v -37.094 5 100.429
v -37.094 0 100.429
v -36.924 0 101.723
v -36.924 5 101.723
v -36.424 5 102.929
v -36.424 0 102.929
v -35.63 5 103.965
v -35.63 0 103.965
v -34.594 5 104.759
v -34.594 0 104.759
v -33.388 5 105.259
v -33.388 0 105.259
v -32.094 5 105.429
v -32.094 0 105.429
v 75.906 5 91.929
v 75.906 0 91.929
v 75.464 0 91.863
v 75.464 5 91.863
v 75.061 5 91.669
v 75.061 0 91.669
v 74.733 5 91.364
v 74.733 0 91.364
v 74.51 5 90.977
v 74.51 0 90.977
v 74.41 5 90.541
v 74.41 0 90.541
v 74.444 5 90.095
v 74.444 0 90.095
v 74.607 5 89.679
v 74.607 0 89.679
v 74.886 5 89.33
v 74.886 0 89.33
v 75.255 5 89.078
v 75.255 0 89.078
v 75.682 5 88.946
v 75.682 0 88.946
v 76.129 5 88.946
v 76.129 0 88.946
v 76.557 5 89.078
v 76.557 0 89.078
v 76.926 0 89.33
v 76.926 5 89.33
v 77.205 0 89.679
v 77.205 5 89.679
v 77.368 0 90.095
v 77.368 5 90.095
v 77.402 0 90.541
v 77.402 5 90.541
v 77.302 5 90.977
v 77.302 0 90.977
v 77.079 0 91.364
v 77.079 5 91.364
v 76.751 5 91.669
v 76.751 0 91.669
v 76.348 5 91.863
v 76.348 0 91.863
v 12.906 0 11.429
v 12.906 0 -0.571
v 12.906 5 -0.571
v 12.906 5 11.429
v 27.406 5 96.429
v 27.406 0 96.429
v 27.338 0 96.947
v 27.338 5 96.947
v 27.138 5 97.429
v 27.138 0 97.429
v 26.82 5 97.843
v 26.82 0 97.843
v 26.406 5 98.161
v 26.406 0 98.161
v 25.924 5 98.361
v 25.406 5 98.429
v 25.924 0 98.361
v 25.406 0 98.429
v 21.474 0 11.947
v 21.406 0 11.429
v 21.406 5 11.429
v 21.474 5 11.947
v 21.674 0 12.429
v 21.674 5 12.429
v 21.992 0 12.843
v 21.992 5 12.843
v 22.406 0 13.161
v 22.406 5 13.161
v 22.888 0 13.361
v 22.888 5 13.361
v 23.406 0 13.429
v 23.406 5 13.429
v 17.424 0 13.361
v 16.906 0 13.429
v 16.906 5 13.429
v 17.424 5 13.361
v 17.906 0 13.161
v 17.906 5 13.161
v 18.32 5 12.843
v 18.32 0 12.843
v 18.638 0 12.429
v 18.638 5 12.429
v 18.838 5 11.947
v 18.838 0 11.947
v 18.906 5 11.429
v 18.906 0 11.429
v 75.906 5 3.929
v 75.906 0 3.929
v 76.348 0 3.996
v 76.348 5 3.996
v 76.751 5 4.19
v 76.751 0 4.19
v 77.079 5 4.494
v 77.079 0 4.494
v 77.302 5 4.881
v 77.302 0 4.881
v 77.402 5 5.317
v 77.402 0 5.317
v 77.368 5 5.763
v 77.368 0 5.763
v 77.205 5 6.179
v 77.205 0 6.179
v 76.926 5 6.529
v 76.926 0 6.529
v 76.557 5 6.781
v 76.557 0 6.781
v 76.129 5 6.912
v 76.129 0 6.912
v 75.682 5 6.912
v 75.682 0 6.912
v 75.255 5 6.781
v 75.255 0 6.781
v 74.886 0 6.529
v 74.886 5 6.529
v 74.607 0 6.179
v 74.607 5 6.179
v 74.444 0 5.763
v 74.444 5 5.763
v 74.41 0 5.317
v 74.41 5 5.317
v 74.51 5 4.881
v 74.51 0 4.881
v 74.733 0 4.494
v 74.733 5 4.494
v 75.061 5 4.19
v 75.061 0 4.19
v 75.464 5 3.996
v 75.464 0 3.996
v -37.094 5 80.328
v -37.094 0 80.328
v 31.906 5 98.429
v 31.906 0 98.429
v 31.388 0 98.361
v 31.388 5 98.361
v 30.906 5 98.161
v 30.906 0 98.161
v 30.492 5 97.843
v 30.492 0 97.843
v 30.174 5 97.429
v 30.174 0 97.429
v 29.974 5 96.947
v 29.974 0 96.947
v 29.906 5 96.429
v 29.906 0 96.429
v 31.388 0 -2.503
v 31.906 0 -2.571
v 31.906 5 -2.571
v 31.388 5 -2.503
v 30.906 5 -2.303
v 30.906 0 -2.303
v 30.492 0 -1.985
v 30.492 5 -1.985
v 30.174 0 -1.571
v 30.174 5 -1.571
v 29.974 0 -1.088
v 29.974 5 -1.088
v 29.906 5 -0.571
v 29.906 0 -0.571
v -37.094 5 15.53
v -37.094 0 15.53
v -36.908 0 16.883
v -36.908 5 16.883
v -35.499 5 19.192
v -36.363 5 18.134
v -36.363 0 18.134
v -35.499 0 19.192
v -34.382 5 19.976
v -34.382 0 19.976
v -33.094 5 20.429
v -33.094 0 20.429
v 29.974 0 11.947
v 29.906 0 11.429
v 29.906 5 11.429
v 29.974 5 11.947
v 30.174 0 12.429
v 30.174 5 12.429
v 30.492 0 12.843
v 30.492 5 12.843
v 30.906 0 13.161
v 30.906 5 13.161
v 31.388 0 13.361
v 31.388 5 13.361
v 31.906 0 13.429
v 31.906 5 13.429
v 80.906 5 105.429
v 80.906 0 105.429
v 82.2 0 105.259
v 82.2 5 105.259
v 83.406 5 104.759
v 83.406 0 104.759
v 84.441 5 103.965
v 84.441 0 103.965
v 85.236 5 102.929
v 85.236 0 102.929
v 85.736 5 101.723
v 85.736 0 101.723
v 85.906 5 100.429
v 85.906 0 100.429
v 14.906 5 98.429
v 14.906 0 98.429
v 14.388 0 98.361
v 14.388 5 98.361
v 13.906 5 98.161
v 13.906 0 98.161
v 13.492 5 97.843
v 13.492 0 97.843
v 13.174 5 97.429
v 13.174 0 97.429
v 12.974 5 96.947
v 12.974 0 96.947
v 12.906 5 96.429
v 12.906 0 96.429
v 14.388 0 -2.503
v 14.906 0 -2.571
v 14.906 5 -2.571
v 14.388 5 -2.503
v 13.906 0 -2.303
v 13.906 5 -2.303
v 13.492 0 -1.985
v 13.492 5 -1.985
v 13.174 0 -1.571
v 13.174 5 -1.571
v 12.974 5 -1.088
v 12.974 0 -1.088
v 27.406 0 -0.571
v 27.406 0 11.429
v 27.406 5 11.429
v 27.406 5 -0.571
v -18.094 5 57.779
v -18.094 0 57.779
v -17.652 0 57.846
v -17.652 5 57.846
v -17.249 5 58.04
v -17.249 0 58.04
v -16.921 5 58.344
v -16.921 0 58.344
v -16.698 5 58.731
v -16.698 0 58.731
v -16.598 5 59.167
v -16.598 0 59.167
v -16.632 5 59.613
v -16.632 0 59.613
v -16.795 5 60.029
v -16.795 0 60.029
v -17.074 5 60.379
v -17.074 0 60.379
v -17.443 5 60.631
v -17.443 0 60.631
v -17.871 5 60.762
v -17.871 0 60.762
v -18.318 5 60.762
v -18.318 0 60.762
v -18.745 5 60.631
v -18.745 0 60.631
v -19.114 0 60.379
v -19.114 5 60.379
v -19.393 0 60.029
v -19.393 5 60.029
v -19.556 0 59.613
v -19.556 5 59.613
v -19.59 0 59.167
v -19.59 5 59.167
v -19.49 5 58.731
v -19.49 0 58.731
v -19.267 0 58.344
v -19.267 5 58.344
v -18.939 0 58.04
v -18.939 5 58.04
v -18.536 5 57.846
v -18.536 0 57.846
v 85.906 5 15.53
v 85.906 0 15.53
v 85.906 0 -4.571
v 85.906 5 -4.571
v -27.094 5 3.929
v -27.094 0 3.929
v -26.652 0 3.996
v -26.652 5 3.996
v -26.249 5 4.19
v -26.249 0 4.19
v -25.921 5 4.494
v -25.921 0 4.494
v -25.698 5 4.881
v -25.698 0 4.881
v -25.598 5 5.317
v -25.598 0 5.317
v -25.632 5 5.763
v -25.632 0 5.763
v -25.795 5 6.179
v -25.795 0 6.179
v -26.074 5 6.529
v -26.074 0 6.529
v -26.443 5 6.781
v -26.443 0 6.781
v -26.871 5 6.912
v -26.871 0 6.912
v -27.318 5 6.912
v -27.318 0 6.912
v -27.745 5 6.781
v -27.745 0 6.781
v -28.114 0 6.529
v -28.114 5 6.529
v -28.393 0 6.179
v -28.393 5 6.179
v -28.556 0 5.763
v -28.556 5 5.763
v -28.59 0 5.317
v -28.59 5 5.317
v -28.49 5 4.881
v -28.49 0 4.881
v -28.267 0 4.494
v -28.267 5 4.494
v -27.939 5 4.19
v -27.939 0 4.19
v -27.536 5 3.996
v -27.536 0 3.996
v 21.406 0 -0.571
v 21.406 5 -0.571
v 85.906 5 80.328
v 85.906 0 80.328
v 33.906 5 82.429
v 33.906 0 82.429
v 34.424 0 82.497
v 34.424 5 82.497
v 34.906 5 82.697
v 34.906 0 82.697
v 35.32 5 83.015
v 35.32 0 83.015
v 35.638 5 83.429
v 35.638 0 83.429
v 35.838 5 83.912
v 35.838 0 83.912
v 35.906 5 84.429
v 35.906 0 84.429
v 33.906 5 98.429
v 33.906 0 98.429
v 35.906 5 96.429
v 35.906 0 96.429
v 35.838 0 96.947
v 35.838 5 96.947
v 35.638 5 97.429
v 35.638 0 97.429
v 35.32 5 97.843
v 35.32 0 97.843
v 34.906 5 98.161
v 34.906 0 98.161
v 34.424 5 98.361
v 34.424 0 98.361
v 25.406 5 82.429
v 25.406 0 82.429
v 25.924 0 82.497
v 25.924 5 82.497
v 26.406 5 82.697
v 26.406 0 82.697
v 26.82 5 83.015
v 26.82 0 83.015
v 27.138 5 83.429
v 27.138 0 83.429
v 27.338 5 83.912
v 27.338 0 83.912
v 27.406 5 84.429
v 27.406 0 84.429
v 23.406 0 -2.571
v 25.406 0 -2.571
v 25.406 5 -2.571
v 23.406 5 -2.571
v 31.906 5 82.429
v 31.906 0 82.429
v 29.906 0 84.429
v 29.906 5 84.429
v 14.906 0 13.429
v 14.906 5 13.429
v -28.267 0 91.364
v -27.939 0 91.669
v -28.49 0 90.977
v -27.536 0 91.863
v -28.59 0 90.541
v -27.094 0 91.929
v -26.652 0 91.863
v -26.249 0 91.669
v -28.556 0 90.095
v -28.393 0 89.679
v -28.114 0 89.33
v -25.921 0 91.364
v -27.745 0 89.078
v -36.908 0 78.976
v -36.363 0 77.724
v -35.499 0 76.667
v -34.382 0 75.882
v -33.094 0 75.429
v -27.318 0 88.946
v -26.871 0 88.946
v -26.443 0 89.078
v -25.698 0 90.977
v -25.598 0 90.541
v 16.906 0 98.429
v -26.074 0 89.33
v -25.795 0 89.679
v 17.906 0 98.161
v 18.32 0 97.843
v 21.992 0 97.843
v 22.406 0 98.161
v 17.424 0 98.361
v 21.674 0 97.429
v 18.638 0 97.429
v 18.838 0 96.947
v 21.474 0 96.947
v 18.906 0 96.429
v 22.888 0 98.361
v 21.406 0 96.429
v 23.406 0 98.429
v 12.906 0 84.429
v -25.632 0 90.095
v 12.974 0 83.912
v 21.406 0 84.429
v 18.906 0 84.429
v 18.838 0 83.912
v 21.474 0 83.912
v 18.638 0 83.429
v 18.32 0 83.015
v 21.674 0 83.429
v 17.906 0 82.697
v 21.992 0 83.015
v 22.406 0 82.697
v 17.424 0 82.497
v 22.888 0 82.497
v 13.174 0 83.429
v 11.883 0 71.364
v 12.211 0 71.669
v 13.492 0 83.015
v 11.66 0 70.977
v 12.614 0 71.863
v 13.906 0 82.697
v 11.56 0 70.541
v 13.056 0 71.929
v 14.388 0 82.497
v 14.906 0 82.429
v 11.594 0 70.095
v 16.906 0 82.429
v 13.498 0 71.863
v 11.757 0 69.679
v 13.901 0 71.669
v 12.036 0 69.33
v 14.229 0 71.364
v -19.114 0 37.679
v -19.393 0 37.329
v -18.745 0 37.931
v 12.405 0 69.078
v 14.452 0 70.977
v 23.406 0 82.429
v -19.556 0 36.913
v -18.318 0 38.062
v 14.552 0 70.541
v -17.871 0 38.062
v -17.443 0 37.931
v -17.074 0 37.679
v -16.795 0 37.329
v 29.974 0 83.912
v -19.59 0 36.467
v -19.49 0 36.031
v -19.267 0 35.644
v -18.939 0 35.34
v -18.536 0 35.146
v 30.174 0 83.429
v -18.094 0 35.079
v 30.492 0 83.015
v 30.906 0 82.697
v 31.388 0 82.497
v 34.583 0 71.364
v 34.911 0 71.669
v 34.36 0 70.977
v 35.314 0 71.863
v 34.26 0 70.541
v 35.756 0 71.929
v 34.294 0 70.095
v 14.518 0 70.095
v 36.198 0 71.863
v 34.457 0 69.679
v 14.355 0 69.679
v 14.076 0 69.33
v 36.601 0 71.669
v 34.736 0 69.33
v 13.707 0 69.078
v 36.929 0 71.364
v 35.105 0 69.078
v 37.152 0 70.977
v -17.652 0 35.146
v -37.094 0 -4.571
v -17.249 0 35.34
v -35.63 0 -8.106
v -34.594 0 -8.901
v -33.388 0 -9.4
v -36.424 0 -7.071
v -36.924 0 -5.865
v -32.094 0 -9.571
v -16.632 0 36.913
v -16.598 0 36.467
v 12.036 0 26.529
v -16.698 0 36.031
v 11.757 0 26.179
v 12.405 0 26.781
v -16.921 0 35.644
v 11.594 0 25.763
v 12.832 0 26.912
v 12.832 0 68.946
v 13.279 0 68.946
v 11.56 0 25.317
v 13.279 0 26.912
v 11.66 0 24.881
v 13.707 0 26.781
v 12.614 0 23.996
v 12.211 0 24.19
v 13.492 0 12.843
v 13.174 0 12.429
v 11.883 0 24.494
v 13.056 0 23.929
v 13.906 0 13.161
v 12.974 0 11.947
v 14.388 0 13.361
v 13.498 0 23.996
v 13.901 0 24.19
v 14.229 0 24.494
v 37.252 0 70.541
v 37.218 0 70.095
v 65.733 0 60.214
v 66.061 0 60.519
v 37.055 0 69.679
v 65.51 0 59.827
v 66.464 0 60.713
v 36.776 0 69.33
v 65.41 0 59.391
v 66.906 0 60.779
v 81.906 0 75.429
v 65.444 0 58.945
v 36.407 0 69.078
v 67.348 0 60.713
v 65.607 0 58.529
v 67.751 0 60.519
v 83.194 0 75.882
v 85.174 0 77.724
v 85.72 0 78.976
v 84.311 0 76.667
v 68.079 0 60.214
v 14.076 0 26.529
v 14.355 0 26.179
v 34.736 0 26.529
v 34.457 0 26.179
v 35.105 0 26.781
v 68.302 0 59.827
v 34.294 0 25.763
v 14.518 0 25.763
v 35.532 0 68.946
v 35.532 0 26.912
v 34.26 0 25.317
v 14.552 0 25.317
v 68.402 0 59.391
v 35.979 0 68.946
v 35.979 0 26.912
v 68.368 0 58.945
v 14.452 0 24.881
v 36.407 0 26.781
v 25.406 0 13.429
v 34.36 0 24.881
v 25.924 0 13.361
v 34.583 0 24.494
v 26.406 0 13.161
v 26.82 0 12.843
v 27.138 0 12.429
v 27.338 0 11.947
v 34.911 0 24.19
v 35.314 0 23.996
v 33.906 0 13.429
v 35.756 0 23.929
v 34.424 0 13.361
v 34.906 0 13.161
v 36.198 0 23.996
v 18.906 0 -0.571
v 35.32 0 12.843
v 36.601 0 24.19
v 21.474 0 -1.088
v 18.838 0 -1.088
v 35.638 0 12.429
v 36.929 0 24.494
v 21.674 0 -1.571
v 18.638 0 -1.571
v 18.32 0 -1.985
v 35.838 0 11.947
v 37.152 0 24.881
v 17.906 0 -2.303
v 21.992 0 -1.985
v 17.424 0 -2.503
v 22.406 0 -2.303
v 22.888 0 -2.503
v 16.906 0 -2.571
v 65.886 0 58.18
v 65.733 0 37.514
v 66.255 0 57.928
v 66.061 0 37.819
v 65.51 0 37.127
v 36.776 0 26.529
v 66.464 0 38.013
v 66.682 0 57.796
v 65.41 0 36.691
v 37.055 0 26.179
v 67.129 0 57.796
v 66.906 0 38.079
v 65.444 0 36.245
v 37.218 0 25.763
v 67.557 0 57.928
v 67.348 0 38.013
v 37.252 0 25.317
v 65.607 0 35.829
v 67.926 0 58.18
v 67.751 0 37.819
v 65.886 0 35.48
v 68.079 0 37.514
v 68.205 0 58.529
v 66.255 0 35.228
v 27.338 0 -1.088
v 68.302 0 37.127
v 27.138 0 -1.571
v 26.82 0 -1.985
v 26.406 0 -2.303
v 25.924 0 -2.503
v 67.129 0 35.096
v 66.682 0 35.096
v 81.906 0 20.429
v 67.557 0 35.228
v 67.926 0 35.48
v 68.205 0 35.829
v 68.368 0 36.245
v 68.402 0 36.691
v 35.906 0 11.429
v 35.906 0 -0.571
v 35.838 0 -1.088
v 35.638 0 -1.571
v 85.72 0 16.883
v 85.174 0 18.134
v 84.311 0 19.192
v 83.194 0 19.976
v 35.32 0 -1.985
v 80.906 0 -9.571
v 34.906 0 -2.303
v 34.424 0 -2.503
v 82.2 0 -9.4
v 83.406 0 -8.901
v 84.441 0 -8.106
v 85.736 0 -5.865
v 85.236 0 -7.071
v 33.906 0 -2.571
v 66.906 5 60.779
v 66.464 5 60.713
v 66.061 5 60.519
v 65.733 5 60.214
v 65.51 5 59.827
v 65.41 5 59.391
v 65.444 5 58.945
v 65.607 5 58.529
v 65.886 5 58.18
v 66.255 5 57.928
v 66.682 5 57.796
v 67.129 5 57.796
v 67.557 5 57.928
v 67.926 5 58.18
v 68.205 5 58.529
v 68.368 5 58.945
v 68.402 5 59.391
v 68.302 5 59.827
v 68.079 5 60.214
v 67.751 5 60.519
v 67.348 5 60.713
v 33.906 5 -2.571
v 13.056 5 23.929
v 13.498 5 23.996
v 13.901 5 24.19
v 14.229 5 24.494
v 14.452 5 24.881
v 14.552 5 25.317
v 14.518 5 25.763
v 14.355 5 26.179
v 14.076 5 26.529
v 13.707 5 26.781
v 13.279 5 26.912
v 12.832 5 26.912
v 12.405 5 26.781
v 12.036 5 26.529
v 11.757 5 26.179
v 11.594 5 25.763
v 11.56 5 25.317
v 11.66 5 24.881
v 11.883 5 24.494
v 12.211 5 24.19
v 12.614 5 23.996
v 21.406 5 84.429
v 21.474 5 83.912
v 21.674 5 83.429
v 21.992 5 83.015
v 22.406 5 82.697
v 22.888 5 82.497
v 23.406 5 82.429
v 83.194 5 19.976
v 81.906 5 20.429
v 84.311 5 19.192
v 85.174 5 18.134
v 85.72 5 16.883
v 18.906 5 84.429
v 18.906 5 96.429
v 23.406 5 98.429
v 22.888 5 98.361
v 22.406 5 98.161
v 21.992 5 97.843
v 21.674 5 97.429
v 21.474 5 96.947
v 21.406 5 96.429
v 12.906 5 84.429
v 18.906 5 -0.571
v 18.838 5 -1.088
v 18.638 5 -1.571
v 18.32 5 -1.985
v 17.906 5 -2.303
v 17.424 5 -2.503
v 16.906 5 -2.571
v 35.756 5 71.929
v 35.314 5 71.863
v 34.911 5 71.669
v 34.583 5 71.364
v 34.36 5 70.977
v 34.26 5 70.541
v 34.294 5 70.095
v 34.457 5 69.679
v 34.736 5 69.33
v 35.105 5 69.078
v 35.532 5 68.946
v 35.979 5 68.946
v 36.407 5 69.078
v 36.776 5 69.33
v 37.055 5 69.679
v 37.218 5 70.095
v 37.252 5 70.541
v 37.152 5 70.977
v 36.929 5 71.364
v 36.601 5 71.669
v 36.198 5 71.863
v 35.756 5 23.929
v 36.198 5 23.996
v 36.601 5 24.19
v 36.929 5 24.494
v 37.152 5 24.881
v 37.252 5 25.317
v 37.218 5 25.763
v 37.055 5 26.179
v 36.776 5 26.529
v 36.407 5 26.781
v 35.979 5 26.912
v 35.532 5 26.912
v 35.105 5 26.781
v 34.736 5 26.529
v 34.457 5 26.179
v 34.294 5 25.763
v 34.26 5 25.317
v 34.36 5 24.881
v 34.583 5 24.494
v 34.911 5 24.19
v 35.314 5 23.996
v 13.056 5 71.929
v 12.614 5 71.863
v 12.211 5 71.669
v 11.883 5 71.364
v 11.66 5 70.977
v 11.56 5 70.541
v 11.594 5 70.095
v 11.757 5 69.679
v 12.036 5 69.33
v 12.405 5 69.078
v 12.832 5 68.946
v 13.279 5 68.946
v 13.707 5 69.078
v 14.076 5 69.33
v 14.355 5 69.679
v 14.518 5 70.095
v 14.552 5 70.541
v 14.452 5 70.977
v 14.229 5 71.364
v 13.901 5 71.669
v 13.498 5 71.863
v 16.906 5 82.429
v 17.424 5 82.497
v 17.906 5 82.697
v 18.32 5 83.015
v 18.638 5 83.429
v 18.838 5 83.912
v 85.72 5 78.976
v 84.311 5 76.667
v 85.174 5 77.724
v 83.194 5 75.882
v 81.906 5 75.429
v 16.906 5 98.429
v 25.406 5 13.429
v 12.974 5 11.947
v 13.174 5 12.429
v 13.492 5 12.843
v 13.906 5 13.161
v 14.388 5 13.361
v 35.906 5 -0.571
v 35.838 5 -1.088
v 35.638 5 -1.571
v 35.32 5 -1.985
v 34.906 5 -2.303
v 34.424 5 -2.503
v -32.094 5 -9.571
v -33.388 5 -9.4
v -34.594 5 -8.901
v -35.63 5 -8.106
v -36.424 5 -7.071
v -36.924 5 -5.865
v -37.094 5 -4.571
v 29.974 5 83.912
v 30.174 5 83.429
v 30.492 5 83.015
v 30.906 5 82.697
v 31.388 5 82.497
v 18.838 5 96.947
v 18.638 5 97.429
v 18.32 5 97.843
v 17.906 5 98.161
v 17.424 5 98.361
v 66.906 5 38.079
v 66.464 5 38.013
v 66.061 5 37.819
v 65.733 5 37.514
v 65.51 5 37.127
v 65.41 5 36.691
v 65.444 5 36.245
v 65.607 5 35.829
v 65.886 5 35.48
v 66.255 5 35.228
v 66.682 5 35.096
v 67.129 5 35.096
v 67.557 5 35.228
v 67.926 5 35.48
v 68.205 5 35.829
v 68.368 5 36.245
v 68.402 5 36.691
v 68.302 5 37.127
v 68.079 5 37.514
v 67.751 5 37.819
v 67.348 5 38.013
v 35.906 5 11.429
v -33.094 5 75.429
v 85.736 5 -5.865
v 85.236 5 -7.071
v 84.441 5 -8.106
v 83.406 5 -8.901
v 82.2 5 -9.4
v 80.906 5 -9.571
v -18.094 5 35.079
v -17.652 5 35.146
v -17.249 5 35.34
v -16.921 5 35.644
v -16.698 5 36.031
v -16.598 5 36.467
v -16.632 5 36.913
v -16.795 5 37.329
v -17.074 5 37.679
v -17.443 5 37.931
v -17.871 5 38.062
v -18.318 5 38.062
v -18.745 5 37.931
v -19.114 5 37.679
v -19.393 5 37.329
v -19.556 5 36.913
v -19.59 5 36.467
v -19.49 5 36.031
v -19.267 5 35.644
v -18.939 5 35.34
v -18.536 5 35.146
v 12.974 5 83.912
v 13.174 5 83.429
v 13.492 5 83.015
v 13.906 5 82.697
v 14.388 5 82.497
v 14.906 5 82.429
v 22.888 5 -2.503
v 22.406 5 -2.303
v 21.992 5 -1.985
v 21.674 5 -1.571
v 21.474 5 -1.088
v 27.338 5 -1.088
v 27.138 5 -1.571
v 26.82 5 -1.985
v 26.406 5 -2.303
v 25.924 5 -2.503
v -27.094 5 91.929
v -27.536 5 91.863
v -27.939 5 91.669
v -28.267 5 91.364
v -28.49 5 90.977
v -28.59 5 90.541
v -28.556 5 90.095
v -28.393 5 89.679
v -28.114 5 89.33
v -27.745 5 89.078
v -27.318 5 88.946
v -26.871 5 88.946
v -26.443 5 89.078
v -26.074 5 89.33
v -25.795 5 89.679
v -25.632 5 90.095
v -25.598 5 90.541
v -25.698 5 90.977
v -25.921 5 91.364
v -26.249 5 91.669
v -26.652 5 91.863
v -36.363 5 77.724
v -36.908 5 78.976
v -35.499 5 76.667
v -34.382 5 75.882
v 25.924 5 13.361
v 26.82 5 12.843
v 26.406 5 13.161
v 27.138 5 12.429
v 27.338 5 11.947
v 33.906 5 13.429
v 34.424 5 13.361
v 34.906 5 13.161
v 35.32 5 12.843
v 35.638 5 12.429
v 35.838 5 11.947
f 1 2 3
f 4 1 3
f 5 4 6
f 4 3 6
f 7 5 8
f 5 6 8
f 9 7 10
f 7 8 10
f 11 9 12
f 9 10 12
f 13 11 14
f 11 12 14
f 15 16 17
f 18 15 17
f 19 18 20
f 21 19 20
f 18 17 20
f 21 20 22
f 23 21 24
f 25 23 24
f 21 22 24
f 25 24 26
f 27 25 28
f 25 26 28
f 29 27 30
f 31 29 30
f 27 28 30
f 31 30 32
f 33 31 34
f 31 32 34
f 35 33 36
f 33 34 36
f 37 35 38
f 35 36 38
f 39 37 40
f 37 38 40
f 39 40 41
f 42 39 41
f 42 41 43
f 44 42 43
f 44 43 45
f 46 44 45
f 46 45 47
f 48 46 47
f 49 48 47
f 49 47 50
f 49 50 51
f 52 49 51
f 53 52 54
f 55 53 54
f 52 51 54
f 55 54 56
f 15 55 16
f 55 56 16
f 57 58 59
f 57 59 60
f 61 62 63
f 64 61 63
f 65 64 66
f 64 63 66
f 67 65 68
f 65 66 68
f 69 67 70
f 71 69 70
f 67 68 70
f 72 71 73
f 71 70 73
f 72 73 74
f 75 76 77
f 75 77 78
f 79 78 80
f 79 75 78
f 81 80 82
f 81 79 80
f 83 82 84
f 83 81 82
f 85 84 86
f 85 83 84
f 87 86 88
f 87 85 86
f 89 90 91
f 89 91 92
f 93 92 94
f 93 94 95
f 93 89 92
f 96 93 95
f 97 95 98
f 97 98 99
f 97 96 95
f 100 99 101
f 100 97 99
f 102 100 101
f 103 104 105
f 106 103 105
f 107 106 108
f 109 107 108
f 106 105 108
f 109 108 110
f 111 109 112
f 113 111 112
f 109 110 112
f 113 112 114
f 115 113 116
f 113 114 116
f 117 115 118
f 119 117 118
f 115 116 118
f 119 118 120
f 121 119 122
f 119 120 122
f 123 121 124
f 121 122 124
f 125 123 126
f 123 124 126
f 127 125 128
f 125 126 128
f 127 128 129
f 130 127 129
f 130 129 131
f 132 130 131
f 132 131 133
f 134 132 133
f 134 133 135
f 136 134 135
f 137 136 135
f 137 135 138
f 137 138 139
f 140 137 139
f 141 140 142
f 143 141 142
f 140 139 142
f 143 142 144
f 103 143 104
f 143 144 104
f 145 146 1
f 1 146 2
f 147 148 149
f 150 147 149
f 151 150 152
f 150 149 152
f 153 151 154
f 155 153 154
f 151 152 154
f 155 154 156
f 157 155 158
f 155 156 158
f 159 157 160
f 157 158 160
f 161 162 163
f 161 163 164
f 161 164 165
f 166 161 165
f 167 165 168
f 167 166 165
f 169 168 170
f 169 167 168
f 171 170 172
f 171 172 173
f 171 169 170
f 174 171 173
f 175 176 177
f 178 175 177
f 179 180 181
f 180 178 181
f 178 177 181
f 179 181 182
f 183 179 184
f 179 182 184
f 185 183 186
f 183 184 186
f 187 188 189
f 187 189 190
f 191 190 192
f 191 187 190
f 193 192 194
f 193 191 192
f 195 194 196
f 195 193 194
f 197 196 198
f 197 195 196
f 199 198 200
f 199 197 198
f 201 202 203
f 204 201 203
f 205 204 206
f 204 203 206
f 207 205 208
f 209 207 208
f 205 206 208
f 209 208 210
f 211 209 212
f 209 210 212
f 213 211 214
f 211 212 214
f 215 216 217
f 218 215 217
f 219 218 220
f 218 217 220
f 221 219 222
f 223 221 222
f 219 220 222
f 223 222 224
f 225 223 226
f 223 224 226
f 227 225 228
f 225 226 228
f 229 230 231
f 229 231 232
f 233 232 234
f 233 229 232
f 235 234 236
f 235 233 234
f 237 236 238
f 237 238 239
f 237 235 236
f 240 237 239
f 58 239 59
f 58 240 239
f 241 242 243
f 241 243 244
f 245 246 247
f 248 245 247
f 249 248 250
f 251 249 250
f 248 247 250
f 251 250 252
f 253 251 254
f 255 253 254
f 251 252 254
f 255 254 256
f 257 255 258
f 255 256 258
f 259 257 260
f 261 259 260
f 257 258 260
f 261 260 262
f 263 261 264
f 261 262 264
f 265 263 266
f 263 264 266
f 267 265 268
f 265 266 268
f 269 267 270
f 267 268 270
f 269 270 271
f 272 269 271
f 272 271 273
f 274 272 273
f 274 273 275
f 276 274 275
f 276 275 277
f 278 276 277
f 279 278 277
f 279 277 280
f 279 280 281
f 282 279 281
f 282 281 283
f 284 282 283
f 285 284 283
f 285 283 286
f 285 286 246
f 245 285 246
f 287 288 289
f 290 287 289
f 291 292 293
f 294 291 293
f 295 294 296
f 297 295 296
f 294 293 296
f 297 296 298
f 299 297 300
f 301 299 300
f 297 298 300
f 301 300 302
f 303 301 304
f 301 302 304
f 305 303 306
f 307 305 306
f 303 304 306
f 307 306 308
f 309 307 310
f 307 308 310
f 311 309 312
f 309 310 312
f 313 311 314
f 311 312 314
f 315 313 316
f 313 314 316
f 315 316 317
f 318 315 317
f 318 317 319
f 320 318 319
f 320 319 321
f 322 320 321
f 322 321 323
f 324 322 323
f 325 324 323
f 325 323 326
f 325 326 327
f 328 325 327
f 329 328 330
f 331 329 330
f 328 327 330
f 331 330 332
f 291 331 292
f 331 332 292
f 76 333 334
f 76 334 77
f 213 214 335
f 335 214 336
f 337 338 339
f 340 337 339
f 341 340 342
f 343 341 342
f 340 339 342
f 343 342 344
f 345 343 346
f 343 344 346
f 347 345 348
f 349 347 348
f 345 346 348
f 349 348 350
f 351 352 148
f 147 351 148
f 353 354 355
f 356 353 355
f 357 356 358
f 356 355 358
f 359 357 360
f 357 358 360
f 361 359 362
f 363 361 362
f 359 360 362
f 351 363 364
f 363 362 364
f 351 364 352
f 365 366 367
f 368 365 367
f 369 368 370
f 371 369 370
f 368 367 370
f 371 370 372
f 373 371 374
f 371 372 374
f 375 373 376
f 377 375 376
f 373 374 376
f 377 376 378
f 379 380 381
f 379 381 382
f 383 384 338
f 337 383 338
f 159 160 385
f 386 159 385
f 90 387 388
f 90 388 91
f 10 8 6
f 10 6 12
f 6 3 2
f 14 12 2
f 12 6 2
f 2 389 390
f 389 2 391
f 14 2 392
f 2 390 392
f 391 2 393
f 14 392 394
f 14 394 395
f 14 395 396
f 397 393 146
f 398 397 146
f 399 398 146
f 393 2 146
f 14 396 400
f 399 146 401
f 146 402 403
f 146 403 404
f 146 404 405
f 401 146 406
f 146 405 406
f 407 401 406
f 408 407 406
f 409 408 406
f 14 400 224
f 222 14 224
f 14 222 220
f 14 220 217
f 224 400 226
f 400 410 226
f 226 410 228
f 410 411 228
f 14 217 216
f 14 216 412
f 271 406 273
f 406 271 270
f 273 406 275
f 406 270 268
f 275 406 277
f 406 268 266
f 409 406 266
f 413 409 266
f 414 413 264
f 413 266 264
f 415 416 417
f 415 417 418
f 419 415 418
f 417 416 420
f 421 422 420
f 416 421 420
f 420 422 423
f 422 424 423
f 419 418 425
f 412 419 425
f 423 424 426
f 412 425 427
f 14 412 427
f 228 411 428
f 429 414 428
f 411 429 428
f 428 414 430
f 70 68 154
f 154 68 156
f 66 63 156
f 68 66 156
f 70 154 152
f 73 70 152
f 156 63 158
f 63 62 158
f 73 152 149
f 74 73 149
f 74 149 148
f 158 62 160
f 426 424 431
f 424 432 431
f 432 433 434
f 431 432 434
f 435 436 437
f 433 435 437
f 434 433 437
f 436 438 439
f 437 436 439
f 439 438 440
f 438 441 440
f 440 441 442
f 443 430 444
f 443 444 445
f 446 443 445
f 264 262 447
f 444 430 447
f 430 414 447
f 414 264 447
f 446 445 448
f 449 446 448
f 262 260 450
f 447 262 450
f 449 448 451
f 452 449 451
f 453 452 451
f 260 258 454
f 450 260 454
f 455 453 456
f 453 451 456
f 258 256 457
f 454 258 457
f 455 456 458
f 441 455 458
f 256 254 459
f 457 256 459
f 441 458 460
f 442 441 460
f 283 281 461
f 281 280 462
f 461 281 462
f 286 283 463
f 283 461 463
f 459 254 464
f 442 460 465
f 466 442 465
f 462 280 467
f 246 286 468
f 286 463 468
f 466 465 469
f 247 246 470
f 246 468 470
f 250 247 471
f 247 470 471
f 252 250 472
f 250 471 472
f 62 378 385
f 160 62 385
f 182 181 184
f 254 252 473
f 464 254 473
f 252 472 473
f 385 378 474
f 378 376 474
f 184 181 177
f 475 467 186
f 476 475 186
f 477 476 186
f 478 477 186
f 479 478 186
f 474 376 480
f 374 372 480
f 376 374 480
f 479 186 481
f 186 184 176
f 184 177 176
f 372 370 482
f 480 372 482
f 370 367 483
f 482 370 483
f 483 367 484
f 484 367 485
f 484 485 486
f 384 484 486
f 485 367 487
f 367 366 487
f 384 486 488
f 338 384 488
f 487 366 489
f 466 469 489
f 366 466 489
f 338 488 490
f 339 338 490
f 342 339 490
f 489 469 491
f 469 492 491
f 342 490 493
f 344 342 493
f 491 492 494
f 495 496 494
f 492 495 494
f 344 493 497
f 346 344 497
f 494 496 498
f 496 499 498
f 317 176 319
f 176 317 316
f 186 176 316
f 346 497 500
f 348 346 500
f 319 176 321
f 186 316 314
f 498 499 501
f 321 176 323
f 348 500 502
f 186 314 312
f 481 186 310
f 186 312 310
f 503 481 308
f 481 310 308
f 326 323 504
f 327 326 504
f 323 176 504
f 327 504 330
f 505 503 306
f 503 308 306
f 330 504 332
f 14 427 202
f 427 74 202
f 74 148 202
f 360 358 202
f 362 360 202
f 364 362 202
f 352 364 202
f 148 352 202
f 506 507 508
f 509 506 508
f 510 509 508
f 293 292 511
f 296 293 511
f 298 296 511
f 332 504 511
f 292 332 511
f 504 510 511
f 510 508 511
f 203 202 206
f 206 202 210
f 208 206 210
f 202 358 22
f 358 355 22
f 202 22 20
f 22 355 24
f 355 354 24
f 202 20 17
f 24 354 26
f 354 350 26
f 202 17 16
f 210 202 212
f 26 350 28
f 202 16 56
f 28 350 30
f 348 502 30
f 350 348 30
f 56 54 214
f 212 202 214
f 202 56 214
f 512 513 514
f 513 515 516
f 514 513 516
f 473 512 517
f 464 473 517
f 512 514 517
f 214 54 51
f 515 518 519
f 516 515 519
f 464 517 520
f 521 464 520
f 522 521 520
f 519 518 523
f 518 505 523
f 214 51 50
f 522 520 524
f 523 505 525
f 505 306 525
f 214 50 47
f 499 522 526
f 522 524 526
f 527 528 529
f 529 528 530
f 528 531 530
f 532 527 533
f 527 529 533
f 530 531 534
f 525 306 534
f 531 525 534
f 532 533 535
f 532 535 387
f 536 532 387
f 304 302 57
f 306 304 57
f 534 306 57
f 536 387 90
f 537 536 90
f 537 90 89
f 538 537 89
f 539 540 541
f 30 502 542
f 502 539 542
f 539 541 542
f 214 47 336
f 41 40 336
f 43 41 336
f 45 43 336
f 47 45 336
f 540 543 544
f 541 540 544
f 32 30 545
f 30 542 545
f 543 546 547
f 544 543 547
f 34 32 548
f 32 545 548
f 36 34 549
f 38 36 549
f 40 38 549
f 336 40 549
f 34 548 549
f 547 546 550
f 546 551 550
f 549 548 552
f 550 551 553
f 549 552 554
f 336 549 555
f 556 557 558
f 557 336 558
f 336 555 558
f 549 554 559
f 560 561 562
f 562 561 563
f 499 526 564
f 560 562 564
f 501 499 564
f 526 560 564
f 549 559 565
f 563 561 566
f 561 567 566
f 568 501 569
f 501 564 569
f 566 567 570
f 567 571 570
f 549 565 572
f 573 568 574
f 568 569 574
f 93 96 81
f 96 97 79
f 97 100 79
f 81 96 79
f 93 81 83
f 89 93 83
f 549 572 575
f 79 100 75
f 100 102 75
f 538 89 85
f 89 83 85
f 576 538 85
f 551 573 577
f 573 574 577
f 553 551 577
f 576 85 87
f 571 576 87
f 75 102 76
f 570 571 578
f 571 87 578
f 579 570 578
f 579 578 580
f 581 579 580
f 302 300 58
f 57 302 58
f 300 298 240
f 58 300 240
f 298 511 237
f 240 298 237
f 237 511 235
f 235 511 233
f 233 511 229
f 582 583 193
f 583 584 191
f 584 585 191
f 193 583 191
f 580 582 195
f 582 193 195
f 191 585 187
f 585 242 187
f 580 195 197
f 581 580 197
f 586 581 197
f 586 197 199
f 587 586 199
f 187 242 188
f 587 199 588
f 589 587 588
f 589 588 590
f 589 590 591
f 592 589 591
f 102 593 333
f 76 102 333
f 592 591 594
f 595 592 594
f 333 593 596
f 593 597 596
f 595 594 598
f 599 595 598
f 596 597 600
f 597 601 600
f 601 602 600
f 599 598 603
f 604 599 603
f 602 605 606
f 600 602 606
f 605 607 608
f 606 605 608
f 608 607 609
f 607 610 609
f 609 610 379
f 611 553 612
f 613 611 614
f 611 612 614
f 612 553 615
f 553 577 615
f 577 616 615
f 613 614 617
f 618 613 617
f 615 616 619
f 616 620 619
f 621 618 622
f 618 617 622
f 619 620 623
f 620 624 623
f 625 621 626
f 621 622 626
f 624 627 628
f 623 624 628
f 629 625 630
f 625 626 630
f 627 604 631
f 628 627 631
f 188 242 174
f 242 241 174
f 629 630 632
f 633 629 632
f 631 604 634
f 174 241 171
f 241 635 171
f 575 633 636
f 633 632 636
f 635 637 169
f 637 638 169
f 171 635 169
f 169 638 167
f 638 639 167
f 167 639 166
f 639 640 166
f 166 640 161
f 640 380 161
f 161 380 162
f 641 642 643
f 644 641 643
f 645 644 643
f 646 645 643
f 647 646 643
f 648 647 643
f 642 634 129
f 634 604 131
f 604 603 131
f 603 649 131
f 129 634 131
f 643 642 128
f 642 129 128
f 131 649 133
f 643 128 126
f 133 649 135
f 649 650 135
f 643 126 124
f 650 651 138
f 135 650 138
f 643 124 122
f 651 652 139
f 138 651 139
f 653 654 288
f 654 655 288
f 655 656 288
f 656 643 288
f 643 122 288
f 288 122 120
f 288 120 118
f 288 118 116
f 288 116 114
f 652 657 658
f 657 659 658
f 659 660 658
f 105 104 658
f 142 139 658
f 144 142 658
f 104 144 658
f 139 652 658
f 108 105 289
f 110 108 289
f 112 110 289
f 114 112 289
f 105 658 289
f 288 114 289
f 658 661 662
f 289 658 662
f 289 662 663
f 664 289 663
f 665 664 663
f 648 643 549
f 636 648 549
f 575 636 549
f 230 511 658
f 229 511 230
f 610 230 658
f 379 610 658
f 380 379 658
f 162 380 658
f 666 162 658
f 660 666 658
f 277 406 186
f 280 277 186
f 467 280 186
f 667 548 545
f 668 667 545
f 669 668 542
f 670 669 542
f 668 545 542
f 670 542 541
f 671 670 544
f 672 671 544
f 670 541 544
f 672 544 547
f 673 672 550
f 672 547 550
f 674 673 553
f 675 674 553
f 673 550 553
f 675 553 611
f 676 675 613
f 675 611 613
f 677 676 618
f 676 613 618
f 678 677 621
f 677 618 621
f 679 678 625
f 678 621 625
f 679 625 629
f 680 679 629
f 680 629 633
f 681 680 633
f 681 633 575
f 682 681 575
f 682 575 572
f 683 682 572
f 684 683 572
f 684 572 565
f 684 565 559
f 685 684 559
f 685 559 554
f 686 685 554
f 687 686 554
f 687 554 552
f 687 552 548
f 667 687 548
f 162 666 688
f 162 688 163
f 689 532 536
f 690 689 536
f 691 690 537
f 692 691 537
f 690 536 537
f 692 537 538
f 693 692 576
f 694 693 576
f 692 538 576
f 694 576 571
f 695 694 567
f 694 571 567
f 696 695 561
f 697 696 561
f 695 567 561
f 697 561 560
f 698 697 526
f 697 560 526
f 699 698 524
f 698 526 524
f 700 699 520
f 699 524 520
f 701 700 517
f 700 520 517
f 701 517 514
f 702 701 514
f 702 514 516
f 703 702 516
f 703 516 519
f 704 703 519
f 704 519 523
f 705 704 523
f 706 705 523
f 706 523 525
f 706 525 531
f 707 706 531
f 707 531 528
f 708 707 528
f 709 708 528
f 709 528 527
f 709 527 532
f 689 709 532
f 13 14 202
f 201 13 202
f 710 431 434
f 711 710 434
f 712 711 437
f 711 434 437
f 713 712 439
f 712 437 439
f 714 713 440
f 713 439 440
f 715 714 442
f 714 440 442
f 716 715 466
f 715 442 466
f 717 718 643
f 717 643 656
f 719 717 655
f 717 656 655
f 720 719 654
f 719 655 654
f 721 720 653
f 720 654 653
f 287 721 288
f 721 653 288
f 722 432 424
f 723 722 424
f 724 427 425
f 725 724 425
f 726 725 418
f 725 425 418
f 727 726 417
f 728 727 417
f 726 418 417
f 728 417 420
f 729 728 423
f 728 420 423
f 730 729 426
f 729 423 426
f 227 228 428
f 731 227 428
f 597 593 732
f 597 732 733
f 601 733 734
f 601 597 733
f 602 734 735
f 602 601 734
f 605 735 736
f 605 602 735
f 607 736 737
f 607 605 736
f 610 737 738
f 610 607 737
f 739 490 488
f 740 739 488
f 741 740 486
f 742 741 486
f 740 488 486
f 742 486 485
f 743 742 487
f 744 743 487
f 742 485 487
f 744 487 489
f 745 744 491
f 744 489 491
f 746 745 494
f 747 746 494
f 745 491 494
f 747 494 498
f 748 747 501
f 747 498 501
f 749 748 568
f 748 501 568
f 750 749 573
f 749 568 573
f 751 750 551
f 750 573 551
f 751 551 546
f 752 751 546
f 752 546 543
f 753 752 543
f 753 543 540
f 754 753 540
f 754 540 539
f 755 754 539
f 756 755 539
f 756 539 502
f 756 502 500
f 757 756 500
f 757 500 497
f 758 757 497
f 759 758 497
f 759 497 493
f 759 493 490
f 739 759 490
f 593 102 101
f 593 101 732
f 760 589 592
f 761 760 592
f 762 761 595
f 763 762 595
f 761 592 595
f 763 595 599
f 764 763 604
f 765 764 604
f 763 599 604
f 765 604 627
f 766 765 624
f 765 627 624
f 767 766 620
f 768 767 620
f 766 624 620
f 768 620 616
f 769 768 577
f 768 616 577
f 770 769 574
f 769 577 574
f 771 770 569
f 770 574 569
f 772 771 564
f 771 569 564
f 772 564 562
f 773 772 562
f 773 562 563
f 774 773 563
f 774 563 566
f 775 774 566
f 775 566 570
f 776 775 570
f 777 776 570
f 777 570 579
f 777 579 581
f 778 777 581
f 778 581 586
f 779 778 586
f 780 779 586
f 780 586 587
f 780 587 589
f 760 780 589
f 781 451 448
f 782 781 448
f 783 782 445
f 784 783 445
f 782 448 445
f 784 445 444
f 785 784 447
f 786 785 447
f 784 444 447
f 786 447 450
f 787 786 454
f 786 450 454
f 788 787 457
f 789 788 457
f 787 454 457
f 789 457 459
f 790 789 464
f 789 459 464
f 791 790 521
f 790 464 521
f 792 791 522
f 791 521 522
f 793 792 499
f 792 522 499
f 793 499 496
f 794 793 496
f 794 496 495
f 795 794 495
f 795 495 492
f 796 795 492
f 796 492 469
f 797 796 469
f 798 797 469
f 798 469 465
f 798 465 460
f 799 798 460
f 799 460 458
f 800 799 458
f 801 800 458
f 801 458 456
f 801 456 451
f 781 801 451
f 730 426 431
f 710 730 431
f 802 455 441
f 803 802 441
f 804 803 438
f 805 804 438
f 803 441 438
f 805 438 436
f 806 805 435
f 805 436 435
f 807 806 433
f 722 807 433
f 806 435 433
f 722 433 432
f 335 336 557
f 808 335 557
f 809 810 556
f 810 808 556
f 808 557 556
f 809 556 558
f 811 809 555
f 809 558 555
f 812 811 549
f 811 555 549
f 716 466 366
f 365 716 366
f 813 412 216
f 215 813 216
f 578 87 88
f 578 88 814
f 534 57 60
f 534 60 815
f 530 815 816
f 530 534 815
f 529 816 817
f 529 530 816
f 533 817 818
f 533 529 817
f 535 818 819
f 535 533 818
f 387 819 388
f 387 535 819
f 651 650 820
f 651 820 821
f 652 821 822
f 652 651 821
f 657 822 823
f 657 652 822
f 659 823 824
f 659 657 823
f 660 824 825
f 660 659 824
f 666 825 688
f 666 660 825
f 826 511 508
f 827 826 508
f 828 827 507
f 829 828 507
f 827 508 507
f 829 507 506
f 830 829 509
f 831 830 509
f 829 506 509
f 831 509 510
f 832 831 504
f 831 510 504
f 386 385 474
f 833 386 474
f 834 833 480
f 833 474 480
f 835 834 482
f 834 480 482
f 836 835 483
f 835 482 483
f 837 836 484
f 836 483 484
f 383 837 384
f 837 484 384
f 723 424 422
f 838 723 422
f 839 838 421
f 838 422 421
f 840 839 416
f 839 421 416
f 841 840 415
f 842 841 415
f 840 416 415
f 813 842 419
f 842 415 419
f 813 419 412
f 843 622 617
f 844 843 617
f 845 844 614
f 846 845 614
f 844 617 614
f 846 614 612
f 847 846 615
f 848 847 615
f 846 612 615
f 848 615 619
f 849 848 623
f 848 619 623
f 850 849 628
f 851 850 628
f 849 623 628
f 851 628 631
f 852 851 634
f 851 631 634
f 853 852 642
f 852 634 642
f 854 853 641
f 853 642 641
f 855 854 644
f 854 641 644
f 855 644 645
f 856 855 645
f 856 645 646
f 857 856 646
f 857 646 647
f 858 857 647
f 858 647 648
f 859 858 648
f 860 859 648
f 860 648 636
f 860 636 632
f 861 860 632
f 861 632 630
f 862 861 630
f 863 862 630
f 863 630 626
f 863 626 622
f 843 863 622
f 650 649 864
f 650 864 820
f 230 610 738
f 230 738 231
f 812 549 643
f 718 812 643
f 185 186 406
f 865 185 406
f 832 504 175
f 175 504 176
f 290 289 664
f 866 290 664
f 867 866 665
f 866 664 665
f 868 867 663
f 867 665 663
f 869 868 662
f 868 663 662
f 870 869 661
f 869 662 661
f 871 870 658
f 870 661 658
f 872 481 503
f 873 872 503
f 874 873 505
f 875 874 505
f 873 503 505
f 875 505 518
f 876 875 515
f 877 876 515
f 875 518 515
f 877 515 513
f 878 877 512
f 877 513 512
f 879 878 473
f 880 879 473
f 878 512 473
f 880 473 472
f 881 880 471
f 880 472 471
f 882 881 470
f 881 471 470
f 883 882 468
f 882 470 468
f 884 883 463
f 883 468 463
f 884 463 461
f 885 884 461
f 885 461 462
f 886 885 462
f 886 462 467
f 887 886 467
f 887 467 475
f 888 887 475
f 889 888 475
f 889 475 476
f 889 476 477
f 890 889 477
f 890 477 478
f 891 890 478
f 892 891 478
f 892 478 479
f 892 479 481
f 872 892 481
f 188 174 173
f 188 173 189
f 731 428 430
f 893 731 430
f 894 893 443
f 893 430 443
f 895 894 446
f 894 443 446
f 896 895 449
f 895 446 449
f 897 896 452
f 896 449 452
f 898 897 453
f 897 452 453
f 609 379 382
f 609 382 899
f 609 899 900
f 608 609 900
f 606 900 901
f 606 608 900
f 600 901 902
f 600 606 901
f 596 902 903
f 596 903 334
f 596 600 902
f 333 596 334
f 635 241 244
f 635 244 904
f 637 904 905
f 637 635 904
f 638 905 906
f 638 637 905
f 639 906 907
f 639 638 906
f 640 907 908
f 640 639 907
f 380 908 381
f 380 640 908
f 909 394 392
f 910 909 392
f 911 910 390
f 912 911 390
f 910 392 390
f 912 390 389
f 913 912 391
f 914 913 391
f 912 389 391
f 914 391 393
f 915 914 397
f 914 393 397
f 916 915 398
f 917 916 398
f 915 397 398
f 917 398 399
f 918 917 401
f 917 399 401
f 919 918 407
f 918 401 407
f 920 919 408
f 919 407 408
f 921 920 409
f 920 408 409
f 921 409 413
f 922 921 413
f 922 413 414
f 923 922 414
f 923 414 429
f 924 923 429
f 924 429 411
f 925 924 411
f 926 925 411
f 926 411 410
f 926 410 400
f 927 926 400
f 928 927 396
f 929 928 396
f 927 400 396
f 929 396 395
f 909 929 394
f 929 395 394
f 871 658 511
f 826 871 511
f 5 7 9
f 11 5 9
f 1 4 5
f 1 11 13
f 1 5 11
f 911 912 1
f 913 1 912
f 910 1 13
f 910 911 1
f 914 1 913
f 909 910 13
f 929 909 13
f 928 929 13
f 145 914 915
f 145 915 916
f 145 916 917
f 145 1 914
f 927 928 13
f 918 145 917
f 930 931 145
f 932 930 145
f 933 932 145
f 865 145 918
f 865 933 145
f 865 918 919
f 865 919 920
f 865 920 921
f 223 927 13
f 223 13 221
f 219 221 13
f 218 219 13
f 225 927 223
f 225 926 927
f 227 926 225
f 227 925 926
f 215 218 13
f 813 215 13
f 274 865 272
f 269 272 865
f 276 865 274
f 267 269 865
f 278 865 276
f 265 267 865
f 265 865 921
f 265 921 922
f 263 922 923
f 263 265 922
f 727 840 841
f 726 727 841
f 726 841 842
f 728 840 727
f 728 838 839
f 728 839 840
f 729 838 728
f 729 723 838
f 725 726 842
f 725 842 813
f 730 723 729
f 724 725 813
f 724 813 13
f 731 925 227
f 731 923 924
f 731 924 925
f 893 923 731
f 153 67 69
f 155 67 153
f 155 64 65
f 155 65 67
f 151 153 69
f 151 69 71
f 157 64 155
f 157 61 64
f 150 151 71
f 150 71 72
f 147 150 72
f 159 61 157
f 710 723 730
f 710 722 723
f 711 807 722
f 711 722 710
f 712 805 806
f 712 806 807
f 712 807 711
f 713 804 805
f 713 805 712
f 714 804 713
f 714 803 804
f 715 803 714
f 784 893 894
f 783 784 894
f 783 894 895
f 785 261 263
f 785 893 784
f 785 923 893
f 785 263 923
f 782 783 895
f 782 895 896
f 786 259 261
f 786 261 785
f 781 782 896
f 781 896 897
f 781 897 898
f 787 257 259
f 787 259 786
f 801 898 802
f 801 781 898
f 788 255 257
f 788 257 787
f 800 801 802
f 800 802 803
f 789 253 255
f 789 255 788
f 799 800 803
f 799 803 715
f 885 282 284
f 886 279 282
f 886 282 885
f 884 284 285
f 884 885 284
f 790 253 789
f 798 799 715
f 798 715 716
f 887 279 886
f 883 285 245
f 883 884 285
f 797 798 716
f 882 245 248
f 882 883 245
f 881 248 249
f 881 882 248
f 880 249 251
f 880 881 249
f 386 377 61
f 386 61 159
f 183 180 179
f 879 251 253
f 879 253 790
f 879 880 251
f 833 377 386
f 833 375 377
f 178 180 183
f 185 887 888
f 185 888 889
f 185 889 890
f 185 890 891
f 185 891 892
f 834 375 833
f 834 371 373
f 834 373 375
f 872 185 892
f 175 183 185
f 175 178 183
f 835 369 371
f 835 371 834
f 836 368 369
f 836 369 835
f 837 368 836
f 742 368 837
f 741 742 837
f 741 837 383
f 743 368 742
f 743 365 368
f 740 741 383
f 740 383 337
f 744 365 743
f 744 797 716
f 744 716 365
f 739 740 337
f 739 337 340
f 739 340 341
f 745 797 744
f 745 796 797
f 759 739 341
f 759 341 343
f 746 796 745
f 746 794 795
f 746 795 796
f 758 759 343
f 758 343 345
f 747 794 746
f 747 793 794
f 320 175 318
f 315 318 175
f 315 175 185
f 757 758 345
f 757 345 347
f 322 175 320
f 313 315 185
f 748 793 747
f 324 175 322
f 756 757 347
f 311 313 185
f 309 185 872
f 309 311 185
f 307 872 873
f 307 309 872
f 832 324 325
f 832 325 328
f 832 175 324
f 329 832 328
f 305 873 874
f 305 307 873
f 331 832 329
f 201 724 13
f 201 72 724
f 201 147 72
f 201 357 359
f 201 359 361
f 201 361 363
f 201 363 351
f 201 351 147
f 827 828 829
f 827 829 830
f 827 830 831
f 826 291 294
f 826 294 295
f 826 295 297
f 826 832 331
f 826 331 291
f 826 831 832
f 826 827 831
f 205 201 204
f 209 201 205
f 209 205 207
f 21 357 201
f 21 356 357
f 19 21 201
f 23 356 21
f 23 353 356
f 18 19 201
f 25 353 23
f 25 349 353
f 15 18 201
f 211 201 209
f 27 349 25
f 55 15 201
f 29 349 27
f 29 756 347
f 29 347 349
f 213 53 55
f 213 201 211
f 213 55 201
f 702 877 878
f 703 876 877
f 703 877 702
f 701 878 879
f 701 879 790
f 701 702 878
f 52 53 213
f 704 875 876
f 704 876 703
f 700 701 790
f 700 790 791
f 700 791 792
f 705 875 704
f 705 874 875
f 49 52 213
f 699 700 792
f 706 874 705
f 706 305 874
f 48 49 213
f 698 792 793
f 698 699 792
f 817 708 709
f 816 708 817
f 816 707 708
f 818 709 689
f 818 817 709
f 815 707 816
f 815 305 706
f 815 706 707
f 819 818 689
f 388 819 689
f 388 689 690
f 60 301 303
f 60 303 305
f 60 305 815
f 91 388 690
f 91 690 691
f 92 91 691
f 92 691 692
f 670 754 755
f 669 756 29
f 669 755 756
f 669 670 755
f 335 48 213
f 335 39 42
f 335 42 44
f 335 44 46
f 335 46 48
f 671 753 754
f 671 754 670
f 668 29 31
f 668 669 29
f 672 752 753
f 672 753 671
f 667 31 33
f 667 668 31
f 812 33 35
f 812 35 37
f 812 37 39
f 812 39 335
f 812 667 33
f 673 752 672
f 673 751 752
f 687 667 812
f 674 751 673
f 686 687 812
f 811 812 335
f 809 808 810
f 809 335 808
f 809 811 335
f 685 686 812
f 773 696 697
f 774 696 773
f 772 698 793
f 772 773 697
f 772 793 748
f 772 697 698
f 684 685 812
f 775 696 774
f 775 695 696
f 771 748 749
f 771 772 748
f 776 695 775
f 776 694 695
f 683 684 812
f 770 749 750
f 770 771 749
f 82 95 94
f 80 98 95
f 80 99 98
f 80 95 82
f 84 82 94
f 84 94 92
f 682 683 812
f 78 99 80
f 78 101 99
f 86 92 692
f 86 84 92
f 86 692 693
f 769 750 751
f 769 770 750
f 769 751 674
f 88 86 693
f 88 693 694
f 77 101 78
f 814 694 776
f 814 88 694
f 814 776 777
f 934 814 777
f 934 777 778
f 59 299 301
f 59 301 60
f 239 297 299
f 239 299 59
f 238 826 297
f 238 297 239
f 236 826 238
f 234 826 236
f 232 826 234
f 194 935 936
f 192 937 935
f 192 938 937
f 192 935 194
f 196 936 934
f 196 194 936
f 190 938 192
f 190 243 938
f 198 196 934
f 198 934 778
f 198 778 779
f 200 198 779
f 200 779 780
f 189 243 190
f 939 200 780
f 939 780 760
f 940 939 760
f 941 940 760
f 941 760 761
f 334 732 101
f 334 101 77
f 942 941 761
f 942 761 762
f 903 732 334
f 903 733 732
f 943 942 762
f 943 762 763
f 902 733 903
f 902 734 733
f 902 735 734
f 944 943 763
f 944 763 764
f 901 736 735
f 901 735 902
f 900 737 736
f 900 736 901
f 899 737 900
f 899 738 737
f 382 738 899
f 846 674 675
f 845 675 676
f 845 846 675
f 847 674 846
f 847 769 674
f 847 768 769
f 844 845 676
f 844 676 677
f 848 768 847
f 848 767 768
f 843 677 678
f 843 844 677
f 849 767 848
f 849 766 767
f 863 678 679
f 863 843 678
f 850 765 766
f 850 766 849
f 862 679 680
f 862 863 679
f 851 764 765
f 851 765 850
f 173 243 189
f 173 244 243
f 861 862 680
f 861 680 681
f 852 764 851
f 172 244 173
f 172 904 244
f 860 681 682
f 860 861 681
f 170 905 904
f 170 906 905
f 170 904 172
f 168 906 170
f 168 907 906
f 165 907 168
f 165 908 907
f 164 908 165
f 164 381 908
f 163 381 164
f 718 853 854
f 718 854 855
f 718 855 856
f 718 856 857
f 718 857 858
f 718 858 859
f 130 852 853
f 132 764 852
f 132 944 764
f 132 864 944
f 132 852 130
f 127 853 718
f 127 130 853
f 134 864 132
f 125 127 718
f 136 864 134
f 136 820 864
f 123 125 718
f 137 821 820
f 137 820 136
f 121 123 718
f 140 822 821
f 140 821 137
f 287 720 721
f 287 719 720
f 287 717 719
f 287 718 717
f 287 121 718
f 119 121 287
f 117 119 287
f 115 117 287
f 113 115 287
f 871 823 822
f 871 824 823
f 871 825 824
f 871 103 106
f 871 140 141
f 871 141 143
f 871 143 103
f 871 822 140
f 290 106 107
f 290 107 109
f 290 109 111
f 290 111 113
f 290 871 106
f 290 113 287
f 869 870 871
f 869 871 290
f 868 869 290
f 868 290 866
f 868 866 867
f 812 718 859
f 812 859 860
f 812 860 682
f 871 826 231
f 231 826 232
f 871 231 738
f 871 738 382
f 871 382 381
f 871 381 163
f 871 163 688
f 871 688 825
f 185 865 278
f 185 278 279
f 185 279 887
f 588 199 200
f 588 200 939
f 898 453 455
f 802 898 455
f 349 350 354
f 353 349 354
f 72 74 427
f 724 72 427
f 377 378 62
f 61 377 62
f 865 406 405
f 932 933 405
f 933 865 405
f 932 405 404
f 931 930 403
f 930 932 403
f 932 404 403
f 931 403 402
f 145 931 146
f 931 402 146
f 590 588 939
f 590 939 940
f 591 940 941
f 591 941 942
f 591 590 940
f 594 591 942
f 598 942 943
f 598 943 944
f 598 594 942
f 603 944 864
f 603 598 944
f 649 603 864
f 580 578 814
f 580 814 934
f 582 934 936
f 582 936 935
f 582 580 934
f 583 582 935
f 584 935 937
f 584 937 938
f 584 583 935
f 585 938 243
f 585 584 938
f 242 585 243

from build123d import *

# Parameters (mm, degrees)
RESSALTO_EXTRUS_O1_DEPTH = 5
FILETE1_R                = 5
ESBO_O3_R                = 1.5
CORTE_EXTRUS_O1_DEPTH    = 5
ESBO_O5_R                = 1.5
CORTE_EXTRUS_O2_DEPTH    = 10


with BuildPart() as part:
    # Esboço1 → Ressalto-extrusão1 (new body)
    with BuildSketch(Plane(origin=(0, 0, 0), x_dir=(1, 0, 0), z_dir=(0, 1, 0))):
        with BuildLine():
            Line((81.90590785, -20.429188404), (85.90590785, -20.429188404))
            Line((85.90590785, -20.429188404), (85.90590785, 4.570811596))
            ThreePointArc((85.90590785, 4.570811596), (84.441441756, 8.106345502), (80.90590785, 9.570811596))
            Line((80.90590785, 9.570811596), (-32.09409215, 9.570811596))
            ThreePointArc((-32.09409215, 9.570811596), (-35.629626056, 8.106345502), (-37.09409215, 4.570811596))
            Line((-37.09409215, 4.570811596), (-37.09409215, -20.429188404))
            Line((-37.09409215, -20.429188404), (-33.09409215, -20.429188404))
            Line((-33.09409215, -20.429188404), (-33.09409215, -75.429188404))
            Line((-33.09409215, -75.429188404), (-37.09409215, -75.429188404))
            Line((-37.09409215, -75.429188404), (-37.09409215, -100.429188404))
            ThreePointArc((-37.09409215, -100.429188404), (-35.629626056, -103.96472231), (-32.09409215, -105.429188404))
            Line((-32.09409215, -105.429188404), (80.90590785, -105.429188404))
            ThreePointArc((80.90590785, -105.429188404), (84.441441756, -103.96472231), (85.90590785, -100.429188404))
            Line((85.90590785, -100.429188404), (85.90590785, -75.429188404))
            Line((85.90590785, -75.429188404), (81.90590785, -75.429188404))
            Line((81.90590785, -75.429188404), (81.90590785, -20.429188404))
        make_face()
    extrude(amount=RESSALTO_EXTRUS_O1_DEPTH)

    # Filete1
    # the kernel refuses this fillet: 5 mm, written as the material it takes off along each edge
    with BuildSketch(Plane(origin=(-37.09409215, -12.247448714, 75.429188404), x_dir=(1.0, 0, 1.5738521597081158e-12), z_dir=(0, 1, 0)), Plane(origin=(85.90590785, -12.247448714, 20.429188404), x_dir=(-1.0, 0, -1.5685230891899197e-12), z_dir=(0, 1, 0))) as filete1_piece_1:
        with BuildLine():
            CenterArc((5, -4.898979486), FILETE1_R, 101.536959033, 78.463040967)
            Line((0, -4.898979486), (-0.1, -4.898979486))
            Line((-0.1, -4.898979486), (-0.1, 0))
            Line((-0.1, 0), (0, 0.1))
            ThreePointArc((0, 0.1), (2, 0.1), (3.98, 0.09797959))
            Line((3.98, 0.09797959), (4, 0))
        make_face()
    extrude(amount=29.494897428, mode=Mode.SUBTRACT)
    with BuildSketch(Plane(origin=(-37.09409215, -12.247448714, 20.429188404), x_dir=(0, 0, -1), z_dir=(0, 1, 0)), Plane(origin=(85.90590785, -12.247448714, 75.429188404), x_dir=(0, 0, 1), z_dir=(0, 1, 0))) as filete1_piece_2:
        with BuildLine():
            CenterArc((4.898979486, -5), FILETE1_R, 90, 78.463040967)
            Line((0, -4), (-0.09797959, -3.98))
            ThreePointArc((-0.09797959, -3.98), (-0.1, -2), (-0.1, 0))
            Line((-0.1, 0), (0, 0.1))
            Line((0, 0.1), (4.898979486, 0.1))
            Line((4.898979486, 0.1), (4.898979486, 0))
        make_face()
    extrude(amount=29.494897428, mode=Mode.SUBTRACT)

    # Esboço3 → Corte-extrusão1 (cut)
    with BuildSketch(Plane.XZ):
        with Locations(Location((-27.09409215, 5.429188404, 0), (0, 0, 270))):
            Circle(ESBO_O3_R)
        with Locations(Location((75.90590785, 5.429188404, 0), (0, 0, 270))):
            Circle(ESBO_O3_R)
        with Locations(Location((75.90590785, 90.429188404, 0), (0, 0, 90))):
            Circle(ESBO_O3_R)
        with Locations(Location((-27.09409215, 90.429188404, 0), (0, 0, 90))):
            Circle(ESBO_O3_R)
        with BuildLine():
            Line((35.90590785, 84.429188404), (35.90590785, 96.429188404))
            ThreePointArc((35.90590785, 96.429188404), (35.320121412, 97.843401966), (33.90590785, 98.429188404))
            Line((33.90590785, 98.429188404), (31.90590785, 98.429188404))
            ThreePointArc((31.90590785, 98.429188404), (30.491694287, 97.843401966), (29.90590785, 96.429188404))
            Line((29.90590785, 96.429188404), (29.90590785, 84.429188404))
            ThreePointArc((29.90590785, 84.429188404), (30.491694287, 83.014974841), (31.90590785, 82.429188404))
            Line((31.90590785, 82.429188404), (33.90590785, 82.429188404))
            ThreePointArc((33.90590785, 82.429188404), (35.320121412, 83.014974841), (35.90590785, 84.429188404))
        make_face()
        with BuildLine():
            Line((14.90590785, 13.429188404), (16.90590785, 13.429188404))
            ThreePointArc((16.90590785, 13.429188404), (18.320121412, 12.843401966), (18.90590785, 11.429188404))
            Line((18.90590785, 11.429188404), (18.90590785, -0.570811596))
            ThreePointArc((18.90590785, -0.570811596), (18.320121412, -1.985025159), (16.90590785, -2.570811596))
            Line((16.90590785, -2.570811596), (14.90590785, -2.570811596))
            ThreePointArc((14.90590785, -2.570811596), (13.491694287, -1.985025159), (12.90590785, -0.570811596))
            Line((12.90590785, -0.570811596), (12.90590785, 11.429188404))
            ThreePointArc((12.90590785, 11.429188404), (13.491694287, 12.843401966), (14.90590785, 13.429188404))
        make_face()
        with BuildLine():
            Line((23.40590785, 13.429188404), (25.40590785, 13.429188404))
            ThreePointArc((25.40590785, 13.429188404), (26.820121412, 12.843401966), (27.40590785, 11.429188404))
            Line((27.40590785, 11.429188404), (27.40590785, -0.570811596))
            ThreePointArc((27.40590785, -0.570811596), (26.820121412, -1.985025159), (25.40590785, -2.570811596))
            Line((25.40590785, -2.570811596), (23.40590785, -2.570811596))
            ThreePointArc((23.40590785, -2.570811596), (21.991694287, -1.985025159), (21.40590785, -0.570811596))
            Line((21.40590785, -0.570811596), (21.40590785, 11.429188404))
            ThreePointArc((21.40590785, 11.429188404), (21.991694287, 12.843401966), (23.40590785, 13.429188404))
        make_face()
        with BuildLine():
            Line((31.90590785, 13.429188404), (33.90590785, 13.429188404))
            ThreePointArc((33.90590785, 13.429188404), (35.320121412, 12.843401966), (35.90590785, 11.429188404))
            Line((35.90590785, 11.429188404), (35.90590785, -0.570811596))
            ThreePointArc((35.90590785, -0.570811596), (35.320121412, -1.985025159), (33.90590785, -2.570811596))
            Line((33.90590785, -2.570811596), (31.90590785, -2.570811596))
            ThreePointArc((31.90590785, -2.570811596), (30.491694287, -1.985025159), (29.90590785, -0.570811596))
            Line((29.90590785, -0.570811596), (29.90590785, 11.429188404))
            ThreePointArc((29.90590785, 11.429188404), (30.491694287, 12.843401966), (31.90590785, 13.429188404))
        make_face()
        with BuildLine():
            Line((27.40590785, 84.429188404), (27.40590785, 96.429188404))
            ThreePointArc((27.40590785, 96.429188404), (26.820121412, 97.843401966), (25.40590785, 98.429188404))
            Line((25.40590785, 98.429188404), (23.40590785, 98.429188404))
            ThreePointArc((23.40590785, 98.429188404), (21.991694287, 97.843401966), (21.40590785, 96.429188404))
            Line((21.40590785, 96.429188404), (21.40590785, 84.429188404))
            ThreePointArc((21.40590785, 84.429188404), (21.991694287, 83.014974841), (23.40590785, 82.429188404))
            Line((23.40590785, 82.429188404), (25.40590785, 82.429188404))
            ThreePointArc((25.40590785, 82.429188404), (26.820121412, 83.014974841), (27.40590785, 84.429188404))
        make_face()
        with BuildLine():
            Line((18.90590785, 84.429188404), (18.90590785, 96.429188404))
            ThreePointArc((18.90590785, 96.429188404), (18.320121412, 97.843401966), (16.90590785, 98.429188404))
            Line((16.90590785, 98.429188404), (14.90590785, 98.429188404))
            ThreePointArc((14.90590785, 98.429188404), (13.491694287, 97.843401966), (12.90590785, 96.429188404))
            Line((12.90590785, 96.429188404), (12.90590785, 84.429188404))
            ThreePointArc((12.90590785, 84.429188404), (13.491694287, 83.014974841), (14.90590785, 82.429188404))
            Line((14.90590785, 82.429188404), (16.90590785, 82.429188404))
            ThreePointArc((16.90590785, 82.429188404), (18.320121412, 83.014974841), (18.90590785, 84.429188404))
        make_face()
    extrude(amount=-CORTE_EXTRUS_O1_DEPTH, mode=Mode.SUBTRACT)

    # Esboço5 → Corte-extrusão2 (cut)
    with BuildSketch(Plane.XZ):
        with Locations(Location((13.05590785, 25.429188404, 0), (0, 0, 270))):
            Circle(ESBO_O5_R)
        with Locations(Location((35.75590785, 25.429188404, 0), (0, 0, 270))):
            Circle(ESBO_O5_R)
        with Locations(Location((-18.09409215, 59.279188404, 0), (0, 0, 270))):
            Circle(ESBO_O5_R)
        with Locations(Location((-18.09409215, 36.579188404, 0), (0, 0, 270))):
            Circle(ESBO_O5_R)
        with Locations(Location((13.05590785, 70.429188404, 0), (0, 0, 90))):
            Circle(ESBO_O5_R)
        with Locations(Location((35.75590785, 70.429188404, 0), (0, 0, 90))):
            Circle(ESBO_O5_R)
        with Locations(Location((66.90590785, 36.579188404, 0), (0, 0, 90))):
            Circle(ESBO_O5_R)
        with Locations(Location((66.90590785, 59.279188404, 0), (0, 0, 90))):
            Circle(ESBO_O5_R)
    extrude(amount=-CORTE_EXTRUS_O2_DEPTH, mode=Mode.SUBTRACT)


solid = part.part
